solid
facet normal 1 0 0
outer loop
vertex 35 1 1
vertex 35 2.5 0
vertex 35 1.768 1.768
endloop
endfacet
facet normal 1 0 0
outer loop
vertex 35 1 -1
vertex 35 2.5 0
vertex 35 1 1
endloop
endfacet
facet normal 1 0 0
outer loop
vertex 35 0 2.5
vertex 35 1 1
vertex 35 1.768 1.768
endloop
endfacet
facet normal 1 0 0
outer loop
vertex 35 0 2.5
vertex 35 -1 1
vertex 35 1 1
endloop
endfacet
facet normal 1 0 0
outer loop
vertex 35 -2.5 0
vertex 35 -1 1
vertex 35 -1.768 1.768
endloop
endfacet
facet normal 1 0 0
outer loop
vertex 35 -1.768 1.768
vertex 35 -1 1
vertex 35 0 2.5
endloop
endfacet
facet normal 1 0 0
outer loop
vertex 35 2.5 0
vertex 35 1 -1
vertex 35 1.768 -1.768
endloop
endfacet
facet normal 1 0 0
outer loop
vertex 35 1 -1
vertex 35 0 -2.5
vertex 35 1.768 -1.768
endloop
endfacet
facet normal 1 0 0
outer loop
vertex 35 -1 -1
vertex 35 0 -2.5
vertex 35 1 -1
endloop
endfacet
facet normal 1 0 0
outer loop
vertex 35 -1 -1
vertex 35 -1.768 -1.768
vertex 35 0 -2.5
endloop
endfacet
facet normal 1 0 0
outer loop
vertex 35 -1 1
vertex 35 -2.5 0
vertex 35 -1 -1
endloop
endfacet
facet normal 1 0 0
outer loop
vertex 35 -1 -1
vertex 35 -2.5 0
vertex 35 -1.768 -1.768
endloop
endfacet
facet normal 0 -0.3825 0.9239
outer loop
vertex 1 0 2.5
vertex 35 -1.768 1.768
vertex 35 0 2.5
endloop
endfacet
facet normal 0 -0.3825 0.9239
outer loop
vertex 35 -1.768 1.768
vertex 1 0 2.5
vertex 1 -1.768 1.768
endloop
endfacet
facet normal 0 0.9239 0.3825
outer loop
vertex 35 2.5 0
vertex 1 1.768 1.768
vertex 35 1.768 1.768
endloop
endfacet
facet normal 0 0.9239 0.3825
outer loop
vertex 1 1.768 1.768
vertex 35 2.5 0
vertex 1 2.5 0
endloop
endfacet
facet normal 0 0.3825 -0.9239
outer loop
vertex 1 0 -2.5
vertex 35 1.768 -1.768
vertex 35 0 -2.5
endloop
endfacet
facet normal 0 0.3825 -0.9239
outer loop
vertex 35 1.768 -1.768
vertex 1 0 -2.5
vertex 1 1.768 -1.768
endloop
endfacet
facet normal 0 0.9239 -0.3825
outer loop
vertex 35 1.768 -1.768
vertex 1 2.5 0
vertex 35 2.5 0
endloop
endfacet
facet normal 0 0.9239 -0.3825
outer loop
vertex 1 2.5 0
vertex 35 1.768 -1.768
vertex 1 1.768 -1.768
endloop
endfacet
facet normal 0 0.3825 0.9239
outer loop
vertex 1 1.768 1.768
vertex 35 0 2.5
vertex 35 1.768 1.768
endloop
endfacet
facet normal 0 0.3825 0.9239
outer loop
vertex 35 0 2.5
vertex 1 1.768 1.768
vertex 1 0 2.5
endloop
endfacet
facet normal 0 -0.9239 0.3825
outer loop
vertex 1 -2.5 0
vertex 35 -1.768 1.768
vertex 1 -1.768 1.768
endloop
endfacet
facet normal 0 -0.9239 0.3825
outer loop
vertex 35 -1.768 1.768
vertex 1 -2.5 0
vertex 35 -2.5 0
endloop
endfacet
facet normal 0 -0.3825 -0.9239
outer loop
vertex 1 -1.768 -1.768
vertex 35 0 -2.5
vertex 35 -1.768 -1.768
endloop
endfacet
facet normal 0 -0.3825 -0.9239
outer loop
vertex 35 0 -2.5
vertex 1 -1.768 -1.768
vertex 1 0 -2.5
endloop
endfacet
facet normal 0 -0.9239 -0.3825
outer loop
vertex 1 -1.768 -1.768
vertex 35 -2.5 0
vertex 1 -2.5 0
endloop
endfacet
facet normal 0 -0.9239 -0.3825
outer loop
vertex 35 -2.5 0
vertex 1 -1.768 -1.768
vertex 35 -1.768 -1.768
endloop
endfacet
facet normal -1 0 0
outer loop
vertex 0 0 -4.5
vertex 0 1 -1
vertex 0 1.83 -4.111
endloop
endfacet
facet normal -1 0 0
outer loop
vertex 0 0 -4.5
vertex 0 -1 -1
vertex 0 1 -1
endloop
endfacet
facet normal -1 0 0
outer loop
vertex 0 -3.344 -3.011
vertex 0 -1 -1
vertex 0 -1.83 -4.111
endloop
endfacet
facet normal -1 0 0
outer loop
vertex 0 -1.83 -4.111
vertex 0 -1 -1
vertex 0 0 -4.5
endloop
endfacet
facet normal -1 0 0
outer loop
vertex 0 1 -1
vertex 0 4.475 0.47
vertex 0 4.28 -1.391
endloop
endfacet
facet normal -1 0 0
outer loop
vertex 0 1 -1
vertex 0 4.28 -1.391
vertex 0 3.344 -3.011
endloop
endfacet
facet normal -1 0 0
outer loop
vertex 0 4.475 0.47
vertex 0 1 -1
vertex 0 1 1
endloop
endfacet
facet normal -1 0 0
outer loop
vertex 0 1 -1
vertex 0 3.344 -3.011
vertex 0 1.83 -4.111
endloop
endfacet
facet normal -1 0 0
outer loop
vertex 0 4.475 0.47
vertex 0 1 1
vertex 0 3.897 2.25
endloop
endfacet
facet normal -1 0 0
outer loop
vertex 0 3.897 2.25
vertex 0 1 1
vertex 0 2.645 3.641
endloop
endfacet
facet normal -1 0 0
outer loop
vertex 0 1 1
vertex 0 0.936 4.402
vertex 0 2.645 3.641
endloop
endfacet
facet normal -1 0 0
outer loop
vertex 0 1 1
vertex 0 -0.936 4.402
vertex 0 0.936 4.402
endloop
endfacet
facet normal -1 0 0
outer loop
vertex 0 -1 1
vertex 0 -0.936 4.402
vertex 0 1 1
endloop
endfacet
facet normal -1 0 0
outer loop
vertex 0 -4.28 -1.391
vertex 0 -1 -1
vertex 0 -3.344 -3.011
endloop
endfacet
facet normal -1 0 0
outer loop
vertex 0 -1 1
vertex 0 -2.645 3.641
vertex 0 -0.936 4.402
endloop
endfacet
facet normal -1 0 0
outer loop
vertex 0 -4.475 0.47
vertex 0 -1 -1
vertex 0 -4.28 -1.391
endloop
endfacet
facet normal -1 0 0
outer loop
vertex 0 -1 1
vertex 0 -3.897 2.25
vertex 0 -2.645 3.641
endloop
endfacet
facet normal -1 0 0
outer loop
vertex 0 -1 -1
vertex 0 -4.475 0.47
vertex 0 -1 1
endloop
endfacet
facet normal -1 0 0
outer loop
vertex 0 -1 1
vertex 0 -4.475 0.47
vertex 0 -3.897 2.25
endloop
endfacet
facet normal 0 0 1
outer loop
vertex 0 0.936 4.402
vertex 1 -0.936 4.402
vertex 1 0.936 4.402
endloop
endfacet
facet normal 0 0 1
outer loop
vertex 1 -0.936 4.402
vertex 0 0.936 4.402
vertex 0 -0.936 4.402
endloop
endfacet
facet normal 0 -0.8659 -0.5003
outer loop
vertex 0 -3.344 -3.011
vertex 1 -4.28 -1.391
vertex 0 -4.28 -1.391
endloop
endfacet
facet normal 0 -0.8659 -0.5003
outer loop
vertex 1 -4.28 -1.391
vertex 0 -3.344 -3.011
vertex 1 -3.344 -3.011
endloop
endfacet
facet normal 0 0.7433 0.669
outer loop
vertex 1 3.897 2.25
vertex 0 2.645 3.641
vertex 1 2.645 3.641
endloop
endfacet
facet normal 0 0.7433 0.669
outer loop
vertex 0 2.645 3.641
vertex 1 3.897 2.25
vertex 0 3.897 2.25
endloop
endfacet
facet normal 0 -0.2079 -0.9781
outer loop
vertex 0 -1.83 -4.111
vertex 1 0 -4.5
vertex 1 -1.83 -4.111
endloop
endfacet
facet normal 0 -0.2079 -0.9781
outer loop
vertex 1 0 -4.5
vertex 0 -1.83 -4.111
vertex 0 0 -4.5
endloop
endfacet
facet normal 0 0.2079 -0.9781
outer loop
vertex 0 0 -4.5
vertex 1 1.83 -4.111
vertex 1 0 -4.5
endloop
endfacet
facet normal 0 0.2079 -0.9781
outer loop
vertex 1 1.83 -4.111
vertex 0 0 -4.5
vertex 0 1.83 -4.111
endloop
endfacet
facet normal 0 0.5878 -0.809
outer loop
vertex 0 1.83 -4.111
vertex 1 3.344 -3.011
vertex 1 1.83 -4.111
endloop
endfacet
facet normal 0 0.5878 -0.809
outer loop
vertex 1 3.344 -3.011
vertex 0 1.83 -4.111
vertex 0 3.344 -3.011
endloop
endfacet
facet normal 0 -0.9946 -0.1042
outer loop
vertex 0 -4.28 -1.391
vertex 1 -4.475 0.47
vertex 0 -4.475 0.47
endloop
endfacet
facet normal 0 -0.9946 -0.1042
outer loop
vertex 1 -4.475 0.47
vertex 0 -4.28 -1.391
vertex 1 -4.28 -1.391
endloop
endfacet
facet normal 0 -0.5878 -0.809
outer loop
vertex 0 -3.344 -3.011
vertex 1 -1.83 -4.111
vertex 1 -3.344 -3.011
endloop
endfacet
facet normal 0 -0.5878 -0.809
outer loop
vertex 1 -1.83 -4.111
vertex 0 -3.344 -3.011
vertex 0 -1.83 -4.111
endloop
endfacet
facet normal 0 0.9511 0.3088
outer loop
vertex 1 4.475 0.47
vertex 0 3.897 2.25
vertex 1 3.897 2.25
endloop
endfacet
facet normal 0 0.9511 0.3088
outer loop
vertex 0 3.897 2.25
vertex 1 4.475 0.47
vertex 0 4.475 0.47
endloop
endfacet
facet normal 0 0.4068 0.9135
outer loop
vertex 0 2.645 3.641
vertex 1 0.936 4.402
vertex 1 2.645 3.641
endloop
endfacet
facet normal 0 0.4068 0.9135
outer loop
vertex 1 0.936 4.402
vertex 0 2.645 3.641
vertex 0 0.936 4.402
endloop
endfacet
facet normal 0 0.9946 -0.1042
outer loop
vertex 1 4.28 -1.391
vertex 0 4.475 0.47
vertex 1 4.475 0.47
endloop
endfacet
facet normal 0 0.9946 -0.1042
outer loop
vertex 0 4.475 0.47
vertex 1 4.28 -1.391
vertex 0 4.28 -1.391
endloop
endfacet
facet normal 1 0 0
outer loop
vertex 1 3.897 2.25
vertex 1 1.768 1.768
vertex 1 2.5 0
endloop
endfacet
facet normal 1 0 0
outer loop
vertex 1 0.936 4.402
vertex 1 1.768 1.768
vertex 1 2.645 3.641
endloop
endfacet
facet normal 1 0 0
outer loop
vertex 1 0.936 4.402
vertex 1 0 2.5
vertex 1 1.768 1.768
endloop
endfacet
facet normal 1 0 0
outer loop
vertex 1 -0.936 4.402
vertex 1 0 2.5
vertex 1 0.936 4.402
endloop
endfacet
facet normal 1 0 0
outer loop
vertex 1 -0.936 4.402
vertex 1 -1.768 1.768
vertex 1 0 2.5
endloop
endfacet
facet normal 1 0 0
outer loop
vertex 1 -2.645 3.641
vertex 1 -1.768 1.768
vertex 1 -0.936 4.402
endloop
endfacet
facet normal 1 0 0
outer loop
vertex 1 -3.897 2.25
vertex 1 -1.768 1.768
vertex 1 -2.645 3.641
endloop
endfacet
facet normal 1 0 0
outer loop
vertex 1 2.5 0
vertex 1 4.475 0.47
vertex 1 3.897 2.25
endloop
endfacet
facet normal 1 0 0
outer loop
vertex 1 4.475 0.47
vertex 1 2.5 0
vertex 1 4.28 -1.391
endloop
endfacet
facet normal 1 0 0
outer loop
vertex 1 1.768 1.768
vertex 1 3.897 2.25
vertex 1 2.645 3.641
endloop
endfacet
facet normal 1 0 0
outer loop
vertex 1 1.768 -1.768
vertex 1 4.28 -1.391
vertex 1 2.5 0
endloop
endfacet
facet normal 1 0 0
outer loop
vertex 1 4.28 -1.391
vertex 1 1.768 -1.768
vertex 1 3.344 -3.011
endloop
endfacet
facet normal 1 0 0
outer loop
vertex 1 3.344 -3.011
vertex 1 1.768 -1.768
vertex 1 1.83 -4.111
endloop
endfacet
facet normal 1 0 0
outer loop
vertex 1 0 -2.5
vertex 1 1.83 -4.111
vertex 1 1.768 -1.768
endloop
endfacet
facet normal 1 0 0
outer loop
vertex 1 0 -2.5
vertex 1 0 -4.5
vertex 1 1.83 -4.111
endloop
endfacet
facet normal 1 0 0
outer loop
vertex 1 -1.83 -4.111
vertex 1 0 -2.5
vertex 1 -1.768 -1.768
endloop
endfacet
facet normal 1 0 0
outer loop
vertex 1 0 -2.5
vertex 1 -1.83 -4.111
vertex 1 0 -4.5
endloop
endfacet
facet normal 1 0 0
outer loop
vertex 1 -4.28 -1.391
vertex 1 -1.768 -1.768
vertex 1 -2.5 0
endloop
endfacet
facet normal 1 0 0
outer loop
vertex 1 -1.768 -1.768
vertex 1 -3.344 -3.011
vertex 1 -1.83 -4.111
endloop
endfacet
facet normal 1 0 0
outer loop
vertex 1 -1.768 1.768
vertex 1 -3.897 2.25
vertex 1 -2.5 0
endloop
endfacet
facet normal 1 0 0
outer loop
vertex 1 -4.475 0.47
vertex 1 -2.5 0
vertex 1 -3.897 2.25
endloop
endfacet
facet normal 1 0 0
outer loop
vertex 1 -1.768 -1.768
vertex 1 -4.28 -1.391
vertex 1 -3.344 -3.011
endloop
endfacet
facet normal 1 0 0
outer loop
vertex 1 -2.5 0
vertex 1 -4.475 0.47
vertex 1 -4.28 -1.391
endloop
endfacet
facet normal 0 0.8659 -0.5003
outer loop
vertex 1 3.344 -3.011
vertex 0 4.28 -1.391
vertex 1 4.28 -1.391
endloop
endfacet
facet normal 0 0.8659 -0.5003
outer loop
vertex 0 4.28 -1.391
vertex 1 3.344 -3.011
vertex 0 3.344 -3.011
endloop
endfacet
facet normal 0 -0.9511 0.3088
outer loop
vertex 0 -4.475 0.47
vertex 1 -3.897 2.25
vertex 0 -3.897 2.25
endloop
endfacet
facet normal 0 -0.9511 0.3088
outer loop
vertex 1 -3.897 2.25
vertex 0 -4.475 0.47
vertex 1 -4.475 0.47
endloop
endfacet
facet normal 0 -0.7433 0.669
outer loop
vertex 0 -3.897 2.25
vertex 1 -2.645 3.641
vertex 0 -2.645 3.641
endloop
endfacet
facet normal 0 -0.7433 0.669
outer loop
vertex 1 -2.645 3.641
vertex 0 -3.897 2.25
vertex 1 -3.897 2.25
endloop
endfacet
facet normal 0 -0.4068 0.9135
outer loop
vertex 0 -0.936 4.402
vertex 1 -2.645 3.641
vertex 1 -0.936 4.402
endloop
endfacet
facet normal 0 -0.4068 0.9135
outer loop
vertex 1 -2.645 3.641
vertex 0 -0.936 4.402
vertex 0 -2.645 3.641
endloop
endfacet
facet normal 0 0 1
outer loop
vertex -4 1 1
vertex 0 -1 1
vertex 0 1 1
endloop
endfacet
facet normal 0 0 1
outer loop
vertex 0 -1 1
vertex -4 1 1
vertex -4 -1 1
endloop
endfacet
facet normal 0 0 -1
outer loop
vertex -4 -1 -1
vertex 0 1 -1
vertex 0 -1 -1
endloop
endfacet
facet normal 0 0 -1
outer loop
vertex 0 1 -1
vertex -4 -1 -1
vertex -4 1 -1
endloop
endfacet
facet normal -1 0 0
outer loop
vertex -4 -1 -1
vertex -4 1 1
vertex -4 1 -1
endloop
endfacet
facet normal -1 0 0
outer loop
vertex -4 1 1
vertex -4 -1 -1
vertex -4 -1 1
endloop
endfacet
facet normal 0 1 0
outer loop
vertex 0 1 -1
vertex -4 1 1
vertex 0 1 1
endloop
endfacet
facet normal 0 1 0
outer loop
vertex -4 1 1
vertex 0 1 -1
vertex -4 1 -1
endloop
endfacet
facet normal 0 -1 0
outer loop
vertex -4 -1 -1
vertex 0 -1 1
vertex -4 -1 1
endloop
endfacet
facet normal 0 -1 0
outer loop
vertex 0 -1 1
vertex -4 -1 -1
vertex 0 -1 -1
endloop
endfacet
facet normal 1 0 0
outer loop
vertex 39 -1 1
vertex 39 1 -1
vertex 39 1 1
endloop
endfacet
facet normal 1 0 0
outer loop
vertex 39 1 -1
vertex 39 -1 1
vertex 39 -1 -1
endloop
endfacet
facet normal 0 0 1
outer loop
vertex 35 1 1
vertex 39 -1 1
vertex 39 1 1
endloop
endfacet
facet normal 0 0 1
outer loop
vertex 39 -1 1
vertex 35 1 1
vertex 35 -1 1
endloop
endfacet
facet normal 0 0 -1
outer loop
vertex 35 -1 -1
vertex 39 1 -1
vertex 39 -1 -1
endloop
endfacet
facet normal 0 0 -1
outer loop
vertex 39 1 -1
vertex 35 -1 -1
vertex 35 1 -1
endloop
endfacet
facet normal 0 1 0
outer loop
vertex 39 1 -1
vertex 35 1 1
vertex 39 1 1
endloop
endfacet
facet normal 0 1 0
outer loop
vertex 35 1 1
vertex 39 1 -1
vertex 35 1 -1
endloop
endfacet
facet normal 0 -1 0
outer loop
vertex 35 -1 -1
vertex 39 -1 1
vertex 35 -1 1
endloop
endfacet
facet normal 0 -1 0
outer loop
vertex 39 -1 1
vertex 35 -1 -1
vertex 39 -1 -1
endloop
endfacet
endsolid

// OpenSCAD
 rotate([0,90,0]) cylinder(35,2.5,2.5);
 rotate([0,90,0]) cylinder(1,4.5,4.5);

 translate([-2,0,0]) cube([4,2,2], center=true);
 translate([37,0,0]) cube([4,2,2], center=true);
